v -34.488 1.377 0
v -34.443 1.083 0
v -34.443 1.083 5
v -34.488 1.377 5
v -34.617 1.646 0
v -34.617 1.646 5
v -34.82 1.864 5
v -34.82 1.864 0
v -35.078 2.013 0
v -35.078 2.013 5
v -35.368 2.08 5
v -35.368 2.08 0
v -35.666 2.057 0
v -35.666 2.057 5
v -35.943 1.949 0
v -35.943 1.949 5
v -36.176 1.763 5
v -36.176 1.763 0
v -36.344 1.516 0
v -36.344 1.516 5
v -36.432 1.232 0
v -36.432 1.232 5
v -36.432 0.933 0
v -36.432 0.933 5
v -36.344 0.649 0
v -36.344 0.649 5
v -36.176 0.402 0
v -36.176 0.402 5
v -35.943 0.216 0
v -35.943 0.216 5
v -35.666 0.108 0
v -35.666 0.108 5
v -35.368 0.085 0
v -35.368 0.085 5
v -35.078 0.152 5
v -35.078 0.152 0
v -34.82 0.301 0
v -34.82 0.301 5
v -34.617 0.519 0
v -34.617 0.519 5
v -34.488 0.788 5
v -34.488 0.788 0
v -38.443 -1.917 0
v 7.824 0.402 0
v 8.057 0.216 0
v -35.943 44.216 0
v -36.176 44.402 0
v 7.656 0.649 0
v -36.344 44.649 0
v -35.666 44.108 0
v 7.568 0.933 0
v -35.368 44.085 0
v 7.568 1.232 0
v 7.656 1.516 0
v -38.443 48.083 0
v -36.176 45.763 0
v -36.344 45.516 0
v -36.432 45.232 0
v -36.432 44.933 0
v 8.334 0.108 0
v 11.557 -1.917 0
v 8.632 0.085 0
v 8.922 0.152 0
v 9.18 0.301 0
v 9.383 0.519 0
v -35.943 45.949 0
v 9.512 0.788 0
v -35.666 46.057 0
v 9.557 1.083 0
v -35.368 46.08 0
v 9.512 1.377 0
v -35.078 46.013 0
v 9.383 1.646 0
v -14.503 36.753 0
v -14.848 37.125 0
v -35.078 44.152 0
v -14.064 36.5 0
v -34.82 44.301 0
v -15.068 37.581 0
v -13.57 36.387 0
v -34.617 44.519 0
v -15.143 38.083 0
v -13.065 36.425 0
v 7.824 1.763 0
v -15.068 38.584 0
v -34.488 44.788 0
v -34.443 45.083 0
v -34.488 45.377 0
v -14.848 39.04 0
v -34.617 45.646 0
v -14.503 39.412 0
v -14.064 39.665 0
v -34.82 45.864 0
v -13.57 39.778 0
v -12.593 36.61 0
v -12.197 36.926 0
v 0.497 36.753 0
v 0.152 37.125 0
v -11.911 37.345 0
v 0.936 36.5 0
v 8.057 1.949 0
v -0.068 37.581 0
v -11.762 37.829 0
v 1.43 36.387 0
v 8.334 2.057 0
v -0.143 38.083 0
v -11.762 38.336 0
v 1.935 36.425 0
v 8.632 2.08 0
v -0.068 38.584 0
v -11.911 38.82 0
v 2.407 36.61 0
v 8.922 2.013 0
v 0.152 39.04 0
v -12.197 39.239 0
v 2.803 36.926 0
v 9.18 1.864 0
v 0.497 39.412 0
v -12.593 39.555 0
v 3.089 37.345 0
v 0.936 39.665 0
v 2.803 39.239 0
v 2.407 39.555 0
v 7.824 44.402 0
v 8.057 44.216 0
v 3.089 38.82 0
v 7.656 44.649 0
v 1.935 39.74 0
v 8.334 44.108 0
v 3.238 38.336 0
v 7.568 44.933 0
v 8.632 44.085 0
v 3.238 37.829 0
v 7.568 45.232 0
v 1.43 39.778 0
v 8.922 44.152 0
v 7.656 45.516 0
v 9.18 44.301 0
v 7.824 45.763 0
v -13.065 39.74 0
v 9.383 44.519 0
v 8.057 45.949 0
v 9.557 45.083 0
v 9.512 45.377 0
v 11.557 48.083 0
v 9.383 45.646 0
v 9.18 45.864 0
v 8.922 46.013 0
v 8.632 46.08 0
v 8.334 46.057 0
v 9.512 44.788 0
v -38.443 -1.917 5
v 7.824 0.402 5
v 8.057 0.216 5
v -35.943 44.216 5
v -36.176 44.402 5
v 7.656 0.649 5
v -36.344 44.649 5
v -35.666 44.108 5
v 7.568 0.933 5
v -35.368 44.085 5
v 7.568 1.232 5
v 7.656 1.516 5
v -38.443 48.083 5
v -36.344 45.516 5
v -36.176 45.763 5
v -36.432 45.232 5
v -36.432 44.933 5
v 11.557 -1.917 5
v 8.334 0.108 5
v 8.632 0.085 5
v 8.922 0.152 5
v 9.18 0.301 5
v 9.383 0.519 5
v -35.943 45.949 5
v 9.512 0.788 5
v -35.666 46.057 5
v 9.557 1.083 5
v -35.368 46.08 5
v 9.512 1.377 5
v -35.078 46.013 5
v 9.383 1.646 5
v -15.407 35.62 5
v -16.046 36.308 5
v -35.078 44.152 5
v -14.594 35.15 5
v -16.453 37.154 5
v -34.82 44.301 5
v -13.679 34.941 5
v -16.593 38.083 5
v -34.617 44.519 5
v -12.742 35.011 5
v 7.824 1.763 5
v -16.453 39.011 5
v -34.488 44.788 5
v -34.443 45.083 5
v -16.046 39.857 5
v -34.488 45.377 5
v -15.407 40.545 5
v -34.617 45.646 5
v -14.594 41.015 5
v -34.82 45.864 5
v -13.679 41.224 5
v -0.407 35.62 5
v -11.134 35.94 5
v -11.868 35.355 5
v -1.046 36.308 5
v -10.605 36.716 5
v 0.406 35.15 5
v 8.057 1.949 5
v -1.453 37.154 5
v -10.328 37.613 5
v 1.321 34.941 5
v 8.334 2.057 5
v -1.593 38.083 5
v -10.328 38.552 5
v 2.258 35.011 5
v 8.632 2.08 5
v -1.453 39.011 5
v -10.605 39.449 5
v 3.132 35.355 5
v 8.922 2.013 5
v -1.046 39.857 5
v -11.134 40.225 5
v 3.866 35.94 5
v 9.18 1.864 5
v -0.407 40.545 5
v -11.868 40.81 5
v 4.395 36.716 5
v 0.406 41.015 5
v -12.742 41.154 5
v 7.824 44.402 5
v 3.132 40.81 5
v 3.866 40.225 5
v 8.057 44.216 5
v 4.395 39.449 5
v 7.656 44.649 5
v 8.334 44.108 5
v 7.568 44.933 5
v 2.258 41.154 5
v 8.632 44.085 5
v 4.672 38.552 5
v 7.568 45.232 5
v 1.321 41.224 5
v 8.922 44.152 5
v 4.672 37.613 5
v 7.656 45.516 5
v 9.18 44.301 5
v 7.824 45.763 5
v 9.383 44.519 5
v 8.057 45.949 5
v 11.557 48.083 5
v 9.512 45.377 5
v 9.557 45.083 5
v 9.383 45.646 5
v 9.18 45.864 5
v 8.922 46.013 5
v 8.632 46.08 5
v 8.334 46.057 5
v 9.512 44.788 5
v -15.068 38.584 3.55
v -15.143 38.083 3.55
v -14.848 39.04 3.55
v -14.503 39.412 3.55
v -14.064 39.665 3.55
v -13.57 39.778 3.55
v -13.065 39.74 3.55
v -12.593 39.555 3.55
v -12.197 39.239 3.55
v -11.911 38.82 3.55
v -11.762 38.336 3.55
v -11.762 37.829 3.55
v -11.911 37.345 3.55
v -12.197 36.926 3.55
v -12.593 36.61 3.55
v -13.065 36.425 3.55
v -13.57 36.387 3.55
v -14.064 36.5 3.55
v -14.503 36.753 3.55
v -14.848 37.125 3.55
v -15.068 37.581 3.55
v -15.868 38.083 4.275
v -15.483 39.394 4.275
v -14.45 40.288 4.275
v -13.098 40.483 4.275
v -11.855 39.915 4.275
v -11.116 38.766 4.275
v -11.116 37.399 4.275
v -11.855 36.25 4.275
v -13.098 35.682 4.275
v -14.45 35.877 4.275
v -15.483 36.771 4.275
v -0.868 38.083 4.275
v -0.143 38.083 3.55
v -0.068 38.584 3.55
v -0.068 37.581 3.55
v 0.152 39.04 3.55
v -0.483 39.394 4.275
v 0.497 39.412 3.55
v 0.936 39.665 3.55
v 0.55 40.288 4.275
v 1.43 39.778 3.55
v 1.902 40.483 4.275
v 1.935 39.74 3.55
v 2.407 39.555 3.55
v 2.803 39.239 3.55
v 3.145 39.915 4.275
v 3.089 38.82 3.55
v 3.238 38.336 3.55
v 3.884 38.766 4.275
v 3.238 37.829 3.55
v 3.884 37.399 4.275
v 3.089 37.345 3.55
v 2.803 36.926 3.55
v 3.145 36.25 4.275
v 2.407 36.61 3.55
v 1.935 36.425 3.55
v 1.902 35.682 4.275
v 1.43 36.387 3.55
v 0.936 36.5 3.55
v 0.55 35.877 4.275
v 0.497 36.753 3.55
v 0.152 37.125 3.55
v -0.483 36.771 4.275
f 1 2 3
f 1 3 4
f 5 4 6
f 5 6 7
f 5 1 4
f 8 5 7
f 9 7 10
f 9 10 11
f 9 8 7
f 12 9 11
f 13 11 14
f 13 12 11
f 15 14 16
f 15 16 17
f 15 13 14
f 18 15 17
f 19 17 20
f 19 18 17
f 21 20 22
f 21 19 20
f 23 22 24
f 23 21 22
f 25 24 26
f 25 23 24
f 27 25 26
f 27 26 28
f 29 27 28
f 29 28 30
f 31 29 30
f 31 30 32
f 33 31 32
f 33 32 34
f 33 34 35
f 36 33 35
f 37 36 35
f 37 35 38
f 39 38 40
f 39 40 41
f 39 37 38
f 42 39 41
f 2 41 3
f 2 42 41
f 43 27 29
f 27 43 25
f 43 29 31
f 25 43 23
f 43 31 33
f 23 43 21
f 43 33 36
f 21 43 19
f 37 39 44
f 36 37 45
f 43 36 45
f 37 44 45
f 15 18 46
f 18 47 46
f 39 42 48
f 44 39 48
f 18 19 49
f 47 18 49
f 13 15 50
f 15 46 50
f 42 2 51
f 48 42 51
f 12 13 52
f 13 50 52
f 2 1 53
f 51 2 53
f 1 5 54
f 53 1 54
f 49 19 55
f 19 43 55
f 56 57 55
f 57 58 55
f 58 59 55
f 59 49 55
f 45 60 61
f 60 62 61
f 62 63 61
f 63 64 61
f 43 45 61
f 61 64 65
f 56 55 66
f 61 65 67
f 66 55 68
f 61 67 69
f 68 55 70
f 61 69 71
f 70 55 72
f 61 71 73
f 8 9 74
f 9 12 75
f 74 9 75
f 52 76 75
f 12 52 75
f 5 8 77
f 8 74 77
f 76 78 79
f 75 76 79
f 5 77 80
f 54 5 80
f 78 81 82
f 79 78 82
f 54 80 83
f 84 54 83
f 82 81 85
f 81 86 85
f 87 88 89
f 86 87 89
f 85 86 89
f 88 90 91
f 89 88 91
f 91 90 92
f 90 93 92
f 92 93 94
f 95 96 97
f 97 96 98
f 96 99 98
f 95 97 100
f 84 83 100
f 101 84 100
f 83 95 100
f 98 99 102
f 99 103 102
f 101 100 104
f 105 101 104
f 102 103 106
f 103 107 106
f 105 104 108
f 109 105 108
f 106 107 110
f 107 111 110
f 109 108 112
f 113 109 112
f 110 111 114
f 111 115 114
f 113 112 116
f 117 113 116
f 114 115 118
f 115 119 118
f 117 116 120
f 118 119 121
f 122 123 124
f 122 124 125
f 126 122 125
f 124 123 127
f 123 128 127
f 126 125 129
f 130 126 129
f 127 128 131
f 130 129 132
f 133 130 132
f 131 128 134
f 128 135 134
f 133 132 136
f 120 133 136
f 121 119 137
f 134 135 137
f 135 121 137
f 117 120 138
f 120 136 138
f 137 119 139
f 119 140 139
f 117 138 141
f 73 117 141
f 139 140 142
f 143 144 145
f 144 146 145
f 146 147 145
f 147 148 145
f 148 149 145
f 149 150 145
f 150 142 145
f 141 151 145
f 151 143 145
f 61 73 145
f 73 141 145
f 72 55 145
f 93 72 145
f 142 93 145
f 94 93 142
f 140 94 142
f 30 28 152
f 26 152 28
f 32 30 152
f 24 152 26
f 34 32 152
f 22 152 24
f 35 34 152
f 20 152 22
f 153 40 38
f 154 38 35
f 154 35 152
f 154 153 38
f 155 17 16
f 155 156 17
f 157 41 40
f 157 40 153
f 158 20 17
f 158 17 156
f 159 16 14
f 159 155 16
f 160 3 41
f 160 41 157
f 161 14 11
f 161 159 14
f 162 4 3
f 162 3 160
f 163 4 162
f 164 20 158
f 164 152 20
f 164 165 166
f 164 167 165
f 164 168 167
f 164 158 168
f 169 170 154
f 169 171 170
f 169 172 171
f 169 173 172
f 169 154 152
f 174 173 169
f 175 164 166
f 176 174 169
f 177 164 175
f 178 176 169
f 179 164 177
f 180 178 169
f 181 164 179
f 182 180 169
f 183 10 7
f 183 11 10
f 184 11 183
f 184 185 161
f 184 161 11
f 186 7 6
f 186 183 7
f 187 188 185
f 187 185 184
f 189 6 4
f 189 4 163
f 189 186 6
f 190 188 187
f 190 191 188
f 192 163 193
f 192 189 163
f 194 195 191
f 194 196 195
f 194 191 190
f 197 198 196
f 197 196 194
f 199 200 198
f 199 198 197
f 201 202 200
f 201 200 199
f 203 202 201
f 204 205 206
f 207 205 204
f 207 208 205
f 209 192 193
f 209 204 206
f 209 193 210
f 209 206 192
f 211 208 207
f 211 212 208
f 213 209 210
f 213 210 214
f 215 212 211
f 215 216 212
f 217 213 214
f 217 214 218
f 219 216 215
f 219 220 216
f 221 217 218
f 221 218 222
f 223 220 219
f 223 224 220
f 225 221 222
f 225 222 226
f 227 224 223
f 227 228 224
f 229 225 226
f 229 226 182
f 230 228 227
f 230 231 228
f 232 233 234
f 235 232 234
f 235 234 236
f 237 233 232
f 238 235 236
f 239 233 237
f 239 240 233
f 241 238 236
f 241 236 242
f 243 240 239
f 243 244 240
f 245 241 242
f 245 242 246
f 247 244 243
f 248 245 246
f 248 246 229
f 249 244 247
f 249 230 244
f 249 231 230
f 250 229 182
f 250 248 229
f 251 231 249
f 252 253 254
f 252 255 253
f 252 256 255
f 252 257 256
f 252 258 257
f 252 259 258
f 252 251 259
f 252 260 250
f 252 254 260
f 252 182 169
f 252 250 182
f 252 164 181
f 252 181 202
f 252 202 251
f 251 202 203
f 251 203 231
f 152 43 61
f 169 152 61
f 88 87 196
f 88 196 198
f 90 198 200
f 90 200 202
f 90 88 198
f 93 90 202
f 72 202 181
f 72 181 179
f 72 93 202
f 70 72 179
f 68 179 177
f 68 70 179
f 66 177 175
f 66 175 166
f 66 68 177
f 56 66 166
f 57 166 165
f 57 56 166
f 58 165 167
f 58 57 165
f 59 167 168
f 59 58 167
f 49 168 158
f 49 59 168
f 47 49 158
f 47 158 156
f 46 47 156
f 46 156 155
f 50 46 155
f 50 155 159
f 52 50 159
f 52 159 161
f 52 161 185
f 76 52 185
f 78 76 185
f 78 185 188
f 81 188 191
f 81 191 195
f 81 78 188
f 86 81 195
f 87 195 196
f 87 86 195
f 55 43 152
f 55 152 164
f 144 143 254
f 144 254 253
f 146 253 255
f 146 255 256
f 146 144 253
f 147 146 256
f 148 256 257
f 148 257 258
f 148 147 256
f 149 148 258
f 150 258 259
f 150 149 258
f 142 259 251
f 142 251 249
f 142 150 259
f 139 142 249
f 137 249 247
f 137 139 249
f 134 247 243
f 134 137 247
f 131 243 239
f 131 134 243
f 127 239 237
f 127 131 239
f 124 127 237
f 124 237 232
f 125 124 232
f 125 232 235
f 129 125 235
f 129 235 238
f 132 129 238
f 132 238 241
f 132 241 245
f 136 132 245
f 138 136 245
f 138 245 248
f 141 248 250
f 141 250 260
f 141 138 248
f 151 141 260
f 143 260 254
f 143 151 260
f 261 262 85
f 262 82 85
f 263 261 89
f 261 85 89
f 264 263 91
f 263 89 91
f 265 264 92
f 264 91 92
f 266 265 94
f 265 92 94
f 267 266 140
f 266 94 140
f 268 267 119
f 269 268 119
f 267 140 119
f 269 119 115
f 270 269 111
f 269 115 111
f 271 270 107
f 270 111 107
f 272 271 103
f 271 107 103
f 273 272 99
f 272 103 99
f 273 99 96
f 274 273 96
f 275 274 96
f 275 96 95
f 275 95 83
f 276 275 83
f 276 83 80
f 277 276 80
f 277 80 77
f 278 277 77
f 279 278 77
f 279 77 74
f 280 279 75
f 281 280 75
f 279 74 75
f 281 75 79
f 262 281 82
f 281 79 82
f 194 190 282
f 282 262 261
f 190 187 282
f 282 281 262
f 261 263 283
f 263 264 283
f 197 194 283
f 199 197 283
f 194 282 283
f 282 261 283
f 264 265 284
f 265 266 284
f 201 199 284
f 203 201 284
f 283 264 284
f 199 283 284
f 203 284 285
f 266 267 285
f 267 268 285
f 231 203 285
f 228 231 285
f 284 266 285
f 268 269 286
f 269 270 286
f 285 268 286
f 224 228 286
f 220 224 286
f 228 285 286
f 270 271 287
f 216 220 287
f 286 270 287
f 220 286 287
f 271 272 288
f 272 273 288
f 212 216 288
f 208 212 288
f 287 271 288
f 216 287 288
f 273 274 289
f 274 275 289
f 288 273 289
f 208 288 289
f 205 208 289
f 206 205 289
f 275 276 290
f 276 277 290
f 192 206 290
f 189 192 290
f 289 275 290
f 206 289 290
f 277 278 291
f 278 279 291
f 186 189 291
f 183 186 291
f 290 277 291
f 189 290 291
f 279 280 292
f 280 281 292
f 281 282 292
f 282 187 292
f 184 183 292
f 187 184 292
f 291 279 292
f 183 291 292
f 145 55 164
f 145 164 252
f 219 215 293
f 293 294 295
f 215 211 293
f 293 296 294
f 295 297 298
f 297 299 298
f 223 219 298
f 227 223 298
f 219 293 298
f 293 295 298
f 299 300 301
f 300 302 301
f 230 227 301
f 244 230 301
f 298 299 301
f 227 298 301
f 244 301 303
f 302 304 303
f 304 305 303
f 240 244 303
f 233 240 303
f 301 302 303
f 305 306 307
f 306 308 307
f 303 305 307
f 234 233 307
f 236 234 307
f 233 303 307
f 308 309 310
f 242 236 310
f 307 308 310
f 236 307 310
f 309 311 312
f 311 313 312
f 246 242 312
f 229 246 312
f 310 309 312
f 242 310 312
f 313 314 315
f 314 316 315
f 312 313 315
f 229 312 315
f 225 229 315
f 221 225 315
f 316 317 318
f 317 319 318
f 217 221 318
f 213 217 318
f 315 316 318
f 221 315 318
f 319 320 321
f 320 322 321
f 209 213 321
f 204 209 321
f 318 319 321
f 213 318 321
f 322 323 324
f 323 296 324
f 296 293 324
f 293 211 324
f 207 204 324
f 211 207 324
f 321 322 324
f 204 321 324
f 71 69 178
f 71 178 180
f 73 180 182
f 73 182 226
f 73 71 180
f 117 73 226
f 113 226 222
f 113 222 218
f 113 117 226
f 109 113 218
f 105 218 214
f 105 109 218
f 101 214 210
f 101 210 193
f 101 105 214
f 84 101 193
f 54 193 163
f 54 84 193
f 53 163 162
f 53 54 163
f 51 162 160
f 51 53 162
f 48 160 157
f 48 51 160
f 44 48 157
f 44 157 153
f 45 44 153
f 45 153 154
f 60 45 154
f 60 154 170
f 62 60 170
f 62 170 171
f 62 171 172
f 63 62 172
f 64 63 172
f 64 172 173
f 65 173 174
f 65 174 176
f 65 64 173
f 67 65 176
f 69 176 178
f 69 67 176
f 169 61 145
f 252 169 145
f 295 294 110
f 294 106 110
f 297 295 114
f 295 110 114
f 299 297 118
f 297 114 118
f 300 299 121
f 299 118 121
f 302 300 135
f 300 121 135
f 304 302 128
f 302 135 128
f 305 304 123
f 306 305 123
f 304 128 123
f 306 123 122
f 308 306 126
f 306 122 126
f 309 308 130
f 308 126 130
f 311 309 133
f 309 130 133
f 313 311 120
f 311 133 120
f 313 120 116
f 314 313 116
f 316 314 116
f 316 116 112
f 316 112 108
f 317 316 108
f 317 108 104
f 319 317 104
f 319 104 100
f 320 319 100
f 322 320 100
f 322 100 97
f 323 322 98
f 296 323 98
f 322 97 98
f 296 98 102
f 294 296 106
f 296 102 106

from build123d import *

# Parameters (mm, degrees)
ESQUISSE1_W                                       = 50
ESQUISSE1_H                                       = 50
ESQUISSE1_R                                       = 1
BOSS_EXTRU_1_DEPTH                                = 5
FRAISAGE_POUR_VIS_T_TE_FRAIS_E_M31_D              = 3.4
FRAISAGE_POUR_VIS_T_TE_FRAIS_E_M31_CSINK_D        = 6.3
FRAISAGE_POUR_VIS_T_TE_FRAIS_E_M31_CSINK_ANGLE    = 90
FRAISAGE_POUR_VIS_T_TE_FRAIS_E_M31_ON_D           = 3.4
FRAISAGE_POUR_VIS_T_TE_FRAIS_E_M31_ON_CSINK_D     = 6.3
FRAISAGE_POUR_VIS_T_TE_FRAIS_E_M31_ON_CSINK_ANGLE = 90


with BuildPart() as part:
    # Esquisse1 → Boss.-Extru.1 (new body)
    with BuildSketch(Plane.XY):
        with Locations((-13.443105546, 23.082518784)):
            Rectangle(ESQUISSE1_W, ESQUISSE1_H)
        with Locations((-35.443105546, 45.082518784)):
            Circle(ESQUISSE1_R, mode=Mode.SUBTRACT)
        with Locations((8.556894454, 45.082518784)):
            Circle(ESQUISSE1_R, mode=Mode.SUBTRACT)
        with Locations((8.556894454, 1.082518784)):
            Circle(ESQUISSE1_R, mode=Mode.SUBTRACT)
        with Locations((-35.443105546, 1.082518784)):
            Circle(ESQUISSE1_R, mode=Mode.SUBTRACT)
    extrude(amount=BOSS_EXTRU_1_DEPTH)

    # Fraisage pour vis à tête fraisée M31 (through all)
    with Locations(Plane(origin=(-13.443105546, 38.082518784, 5), x_dir=(1, 0, 0), z_dir=(0, 0, 1))):
        with Locations((0, 0), (15, 0)):
            CounterSinkHole(FRAISAGE_POUR_VIS_T_TE_FRAIS_E_M31_D / 2, FRAISAGE_POUR_VIS_T_TE_FRAIS_E_M31_CSINK_D / 2, counter_sink_angle=FRAISAGE_POUR_VIS_T_TE_FRAIS_E_M31_CSINK_ANGLE)

    # Fraisage pour vis à tête fraisée M31 on (through all)
    with Locations(Plane(origin=(-69.932791176, 61.393115675, 0), x_dir=(1, 0, 0), z_dir=(0, 0, 1))):
        with Locations((0, 0)):
            CounterSinkHole(FRAISAGE_POUR_VIS_T_TE_FRAIS_E_M31_ON_D / 2, FRAISAGE_POUR_VIS_T_TE_FRAIS_E_M31_ON_CSINK_D / 2, counter_sink_angle=FRAISAGE_POUR_VIS_T_TE_FRAIS_E_M31_ON_CSINK_ANGLE)


solid = part.part
